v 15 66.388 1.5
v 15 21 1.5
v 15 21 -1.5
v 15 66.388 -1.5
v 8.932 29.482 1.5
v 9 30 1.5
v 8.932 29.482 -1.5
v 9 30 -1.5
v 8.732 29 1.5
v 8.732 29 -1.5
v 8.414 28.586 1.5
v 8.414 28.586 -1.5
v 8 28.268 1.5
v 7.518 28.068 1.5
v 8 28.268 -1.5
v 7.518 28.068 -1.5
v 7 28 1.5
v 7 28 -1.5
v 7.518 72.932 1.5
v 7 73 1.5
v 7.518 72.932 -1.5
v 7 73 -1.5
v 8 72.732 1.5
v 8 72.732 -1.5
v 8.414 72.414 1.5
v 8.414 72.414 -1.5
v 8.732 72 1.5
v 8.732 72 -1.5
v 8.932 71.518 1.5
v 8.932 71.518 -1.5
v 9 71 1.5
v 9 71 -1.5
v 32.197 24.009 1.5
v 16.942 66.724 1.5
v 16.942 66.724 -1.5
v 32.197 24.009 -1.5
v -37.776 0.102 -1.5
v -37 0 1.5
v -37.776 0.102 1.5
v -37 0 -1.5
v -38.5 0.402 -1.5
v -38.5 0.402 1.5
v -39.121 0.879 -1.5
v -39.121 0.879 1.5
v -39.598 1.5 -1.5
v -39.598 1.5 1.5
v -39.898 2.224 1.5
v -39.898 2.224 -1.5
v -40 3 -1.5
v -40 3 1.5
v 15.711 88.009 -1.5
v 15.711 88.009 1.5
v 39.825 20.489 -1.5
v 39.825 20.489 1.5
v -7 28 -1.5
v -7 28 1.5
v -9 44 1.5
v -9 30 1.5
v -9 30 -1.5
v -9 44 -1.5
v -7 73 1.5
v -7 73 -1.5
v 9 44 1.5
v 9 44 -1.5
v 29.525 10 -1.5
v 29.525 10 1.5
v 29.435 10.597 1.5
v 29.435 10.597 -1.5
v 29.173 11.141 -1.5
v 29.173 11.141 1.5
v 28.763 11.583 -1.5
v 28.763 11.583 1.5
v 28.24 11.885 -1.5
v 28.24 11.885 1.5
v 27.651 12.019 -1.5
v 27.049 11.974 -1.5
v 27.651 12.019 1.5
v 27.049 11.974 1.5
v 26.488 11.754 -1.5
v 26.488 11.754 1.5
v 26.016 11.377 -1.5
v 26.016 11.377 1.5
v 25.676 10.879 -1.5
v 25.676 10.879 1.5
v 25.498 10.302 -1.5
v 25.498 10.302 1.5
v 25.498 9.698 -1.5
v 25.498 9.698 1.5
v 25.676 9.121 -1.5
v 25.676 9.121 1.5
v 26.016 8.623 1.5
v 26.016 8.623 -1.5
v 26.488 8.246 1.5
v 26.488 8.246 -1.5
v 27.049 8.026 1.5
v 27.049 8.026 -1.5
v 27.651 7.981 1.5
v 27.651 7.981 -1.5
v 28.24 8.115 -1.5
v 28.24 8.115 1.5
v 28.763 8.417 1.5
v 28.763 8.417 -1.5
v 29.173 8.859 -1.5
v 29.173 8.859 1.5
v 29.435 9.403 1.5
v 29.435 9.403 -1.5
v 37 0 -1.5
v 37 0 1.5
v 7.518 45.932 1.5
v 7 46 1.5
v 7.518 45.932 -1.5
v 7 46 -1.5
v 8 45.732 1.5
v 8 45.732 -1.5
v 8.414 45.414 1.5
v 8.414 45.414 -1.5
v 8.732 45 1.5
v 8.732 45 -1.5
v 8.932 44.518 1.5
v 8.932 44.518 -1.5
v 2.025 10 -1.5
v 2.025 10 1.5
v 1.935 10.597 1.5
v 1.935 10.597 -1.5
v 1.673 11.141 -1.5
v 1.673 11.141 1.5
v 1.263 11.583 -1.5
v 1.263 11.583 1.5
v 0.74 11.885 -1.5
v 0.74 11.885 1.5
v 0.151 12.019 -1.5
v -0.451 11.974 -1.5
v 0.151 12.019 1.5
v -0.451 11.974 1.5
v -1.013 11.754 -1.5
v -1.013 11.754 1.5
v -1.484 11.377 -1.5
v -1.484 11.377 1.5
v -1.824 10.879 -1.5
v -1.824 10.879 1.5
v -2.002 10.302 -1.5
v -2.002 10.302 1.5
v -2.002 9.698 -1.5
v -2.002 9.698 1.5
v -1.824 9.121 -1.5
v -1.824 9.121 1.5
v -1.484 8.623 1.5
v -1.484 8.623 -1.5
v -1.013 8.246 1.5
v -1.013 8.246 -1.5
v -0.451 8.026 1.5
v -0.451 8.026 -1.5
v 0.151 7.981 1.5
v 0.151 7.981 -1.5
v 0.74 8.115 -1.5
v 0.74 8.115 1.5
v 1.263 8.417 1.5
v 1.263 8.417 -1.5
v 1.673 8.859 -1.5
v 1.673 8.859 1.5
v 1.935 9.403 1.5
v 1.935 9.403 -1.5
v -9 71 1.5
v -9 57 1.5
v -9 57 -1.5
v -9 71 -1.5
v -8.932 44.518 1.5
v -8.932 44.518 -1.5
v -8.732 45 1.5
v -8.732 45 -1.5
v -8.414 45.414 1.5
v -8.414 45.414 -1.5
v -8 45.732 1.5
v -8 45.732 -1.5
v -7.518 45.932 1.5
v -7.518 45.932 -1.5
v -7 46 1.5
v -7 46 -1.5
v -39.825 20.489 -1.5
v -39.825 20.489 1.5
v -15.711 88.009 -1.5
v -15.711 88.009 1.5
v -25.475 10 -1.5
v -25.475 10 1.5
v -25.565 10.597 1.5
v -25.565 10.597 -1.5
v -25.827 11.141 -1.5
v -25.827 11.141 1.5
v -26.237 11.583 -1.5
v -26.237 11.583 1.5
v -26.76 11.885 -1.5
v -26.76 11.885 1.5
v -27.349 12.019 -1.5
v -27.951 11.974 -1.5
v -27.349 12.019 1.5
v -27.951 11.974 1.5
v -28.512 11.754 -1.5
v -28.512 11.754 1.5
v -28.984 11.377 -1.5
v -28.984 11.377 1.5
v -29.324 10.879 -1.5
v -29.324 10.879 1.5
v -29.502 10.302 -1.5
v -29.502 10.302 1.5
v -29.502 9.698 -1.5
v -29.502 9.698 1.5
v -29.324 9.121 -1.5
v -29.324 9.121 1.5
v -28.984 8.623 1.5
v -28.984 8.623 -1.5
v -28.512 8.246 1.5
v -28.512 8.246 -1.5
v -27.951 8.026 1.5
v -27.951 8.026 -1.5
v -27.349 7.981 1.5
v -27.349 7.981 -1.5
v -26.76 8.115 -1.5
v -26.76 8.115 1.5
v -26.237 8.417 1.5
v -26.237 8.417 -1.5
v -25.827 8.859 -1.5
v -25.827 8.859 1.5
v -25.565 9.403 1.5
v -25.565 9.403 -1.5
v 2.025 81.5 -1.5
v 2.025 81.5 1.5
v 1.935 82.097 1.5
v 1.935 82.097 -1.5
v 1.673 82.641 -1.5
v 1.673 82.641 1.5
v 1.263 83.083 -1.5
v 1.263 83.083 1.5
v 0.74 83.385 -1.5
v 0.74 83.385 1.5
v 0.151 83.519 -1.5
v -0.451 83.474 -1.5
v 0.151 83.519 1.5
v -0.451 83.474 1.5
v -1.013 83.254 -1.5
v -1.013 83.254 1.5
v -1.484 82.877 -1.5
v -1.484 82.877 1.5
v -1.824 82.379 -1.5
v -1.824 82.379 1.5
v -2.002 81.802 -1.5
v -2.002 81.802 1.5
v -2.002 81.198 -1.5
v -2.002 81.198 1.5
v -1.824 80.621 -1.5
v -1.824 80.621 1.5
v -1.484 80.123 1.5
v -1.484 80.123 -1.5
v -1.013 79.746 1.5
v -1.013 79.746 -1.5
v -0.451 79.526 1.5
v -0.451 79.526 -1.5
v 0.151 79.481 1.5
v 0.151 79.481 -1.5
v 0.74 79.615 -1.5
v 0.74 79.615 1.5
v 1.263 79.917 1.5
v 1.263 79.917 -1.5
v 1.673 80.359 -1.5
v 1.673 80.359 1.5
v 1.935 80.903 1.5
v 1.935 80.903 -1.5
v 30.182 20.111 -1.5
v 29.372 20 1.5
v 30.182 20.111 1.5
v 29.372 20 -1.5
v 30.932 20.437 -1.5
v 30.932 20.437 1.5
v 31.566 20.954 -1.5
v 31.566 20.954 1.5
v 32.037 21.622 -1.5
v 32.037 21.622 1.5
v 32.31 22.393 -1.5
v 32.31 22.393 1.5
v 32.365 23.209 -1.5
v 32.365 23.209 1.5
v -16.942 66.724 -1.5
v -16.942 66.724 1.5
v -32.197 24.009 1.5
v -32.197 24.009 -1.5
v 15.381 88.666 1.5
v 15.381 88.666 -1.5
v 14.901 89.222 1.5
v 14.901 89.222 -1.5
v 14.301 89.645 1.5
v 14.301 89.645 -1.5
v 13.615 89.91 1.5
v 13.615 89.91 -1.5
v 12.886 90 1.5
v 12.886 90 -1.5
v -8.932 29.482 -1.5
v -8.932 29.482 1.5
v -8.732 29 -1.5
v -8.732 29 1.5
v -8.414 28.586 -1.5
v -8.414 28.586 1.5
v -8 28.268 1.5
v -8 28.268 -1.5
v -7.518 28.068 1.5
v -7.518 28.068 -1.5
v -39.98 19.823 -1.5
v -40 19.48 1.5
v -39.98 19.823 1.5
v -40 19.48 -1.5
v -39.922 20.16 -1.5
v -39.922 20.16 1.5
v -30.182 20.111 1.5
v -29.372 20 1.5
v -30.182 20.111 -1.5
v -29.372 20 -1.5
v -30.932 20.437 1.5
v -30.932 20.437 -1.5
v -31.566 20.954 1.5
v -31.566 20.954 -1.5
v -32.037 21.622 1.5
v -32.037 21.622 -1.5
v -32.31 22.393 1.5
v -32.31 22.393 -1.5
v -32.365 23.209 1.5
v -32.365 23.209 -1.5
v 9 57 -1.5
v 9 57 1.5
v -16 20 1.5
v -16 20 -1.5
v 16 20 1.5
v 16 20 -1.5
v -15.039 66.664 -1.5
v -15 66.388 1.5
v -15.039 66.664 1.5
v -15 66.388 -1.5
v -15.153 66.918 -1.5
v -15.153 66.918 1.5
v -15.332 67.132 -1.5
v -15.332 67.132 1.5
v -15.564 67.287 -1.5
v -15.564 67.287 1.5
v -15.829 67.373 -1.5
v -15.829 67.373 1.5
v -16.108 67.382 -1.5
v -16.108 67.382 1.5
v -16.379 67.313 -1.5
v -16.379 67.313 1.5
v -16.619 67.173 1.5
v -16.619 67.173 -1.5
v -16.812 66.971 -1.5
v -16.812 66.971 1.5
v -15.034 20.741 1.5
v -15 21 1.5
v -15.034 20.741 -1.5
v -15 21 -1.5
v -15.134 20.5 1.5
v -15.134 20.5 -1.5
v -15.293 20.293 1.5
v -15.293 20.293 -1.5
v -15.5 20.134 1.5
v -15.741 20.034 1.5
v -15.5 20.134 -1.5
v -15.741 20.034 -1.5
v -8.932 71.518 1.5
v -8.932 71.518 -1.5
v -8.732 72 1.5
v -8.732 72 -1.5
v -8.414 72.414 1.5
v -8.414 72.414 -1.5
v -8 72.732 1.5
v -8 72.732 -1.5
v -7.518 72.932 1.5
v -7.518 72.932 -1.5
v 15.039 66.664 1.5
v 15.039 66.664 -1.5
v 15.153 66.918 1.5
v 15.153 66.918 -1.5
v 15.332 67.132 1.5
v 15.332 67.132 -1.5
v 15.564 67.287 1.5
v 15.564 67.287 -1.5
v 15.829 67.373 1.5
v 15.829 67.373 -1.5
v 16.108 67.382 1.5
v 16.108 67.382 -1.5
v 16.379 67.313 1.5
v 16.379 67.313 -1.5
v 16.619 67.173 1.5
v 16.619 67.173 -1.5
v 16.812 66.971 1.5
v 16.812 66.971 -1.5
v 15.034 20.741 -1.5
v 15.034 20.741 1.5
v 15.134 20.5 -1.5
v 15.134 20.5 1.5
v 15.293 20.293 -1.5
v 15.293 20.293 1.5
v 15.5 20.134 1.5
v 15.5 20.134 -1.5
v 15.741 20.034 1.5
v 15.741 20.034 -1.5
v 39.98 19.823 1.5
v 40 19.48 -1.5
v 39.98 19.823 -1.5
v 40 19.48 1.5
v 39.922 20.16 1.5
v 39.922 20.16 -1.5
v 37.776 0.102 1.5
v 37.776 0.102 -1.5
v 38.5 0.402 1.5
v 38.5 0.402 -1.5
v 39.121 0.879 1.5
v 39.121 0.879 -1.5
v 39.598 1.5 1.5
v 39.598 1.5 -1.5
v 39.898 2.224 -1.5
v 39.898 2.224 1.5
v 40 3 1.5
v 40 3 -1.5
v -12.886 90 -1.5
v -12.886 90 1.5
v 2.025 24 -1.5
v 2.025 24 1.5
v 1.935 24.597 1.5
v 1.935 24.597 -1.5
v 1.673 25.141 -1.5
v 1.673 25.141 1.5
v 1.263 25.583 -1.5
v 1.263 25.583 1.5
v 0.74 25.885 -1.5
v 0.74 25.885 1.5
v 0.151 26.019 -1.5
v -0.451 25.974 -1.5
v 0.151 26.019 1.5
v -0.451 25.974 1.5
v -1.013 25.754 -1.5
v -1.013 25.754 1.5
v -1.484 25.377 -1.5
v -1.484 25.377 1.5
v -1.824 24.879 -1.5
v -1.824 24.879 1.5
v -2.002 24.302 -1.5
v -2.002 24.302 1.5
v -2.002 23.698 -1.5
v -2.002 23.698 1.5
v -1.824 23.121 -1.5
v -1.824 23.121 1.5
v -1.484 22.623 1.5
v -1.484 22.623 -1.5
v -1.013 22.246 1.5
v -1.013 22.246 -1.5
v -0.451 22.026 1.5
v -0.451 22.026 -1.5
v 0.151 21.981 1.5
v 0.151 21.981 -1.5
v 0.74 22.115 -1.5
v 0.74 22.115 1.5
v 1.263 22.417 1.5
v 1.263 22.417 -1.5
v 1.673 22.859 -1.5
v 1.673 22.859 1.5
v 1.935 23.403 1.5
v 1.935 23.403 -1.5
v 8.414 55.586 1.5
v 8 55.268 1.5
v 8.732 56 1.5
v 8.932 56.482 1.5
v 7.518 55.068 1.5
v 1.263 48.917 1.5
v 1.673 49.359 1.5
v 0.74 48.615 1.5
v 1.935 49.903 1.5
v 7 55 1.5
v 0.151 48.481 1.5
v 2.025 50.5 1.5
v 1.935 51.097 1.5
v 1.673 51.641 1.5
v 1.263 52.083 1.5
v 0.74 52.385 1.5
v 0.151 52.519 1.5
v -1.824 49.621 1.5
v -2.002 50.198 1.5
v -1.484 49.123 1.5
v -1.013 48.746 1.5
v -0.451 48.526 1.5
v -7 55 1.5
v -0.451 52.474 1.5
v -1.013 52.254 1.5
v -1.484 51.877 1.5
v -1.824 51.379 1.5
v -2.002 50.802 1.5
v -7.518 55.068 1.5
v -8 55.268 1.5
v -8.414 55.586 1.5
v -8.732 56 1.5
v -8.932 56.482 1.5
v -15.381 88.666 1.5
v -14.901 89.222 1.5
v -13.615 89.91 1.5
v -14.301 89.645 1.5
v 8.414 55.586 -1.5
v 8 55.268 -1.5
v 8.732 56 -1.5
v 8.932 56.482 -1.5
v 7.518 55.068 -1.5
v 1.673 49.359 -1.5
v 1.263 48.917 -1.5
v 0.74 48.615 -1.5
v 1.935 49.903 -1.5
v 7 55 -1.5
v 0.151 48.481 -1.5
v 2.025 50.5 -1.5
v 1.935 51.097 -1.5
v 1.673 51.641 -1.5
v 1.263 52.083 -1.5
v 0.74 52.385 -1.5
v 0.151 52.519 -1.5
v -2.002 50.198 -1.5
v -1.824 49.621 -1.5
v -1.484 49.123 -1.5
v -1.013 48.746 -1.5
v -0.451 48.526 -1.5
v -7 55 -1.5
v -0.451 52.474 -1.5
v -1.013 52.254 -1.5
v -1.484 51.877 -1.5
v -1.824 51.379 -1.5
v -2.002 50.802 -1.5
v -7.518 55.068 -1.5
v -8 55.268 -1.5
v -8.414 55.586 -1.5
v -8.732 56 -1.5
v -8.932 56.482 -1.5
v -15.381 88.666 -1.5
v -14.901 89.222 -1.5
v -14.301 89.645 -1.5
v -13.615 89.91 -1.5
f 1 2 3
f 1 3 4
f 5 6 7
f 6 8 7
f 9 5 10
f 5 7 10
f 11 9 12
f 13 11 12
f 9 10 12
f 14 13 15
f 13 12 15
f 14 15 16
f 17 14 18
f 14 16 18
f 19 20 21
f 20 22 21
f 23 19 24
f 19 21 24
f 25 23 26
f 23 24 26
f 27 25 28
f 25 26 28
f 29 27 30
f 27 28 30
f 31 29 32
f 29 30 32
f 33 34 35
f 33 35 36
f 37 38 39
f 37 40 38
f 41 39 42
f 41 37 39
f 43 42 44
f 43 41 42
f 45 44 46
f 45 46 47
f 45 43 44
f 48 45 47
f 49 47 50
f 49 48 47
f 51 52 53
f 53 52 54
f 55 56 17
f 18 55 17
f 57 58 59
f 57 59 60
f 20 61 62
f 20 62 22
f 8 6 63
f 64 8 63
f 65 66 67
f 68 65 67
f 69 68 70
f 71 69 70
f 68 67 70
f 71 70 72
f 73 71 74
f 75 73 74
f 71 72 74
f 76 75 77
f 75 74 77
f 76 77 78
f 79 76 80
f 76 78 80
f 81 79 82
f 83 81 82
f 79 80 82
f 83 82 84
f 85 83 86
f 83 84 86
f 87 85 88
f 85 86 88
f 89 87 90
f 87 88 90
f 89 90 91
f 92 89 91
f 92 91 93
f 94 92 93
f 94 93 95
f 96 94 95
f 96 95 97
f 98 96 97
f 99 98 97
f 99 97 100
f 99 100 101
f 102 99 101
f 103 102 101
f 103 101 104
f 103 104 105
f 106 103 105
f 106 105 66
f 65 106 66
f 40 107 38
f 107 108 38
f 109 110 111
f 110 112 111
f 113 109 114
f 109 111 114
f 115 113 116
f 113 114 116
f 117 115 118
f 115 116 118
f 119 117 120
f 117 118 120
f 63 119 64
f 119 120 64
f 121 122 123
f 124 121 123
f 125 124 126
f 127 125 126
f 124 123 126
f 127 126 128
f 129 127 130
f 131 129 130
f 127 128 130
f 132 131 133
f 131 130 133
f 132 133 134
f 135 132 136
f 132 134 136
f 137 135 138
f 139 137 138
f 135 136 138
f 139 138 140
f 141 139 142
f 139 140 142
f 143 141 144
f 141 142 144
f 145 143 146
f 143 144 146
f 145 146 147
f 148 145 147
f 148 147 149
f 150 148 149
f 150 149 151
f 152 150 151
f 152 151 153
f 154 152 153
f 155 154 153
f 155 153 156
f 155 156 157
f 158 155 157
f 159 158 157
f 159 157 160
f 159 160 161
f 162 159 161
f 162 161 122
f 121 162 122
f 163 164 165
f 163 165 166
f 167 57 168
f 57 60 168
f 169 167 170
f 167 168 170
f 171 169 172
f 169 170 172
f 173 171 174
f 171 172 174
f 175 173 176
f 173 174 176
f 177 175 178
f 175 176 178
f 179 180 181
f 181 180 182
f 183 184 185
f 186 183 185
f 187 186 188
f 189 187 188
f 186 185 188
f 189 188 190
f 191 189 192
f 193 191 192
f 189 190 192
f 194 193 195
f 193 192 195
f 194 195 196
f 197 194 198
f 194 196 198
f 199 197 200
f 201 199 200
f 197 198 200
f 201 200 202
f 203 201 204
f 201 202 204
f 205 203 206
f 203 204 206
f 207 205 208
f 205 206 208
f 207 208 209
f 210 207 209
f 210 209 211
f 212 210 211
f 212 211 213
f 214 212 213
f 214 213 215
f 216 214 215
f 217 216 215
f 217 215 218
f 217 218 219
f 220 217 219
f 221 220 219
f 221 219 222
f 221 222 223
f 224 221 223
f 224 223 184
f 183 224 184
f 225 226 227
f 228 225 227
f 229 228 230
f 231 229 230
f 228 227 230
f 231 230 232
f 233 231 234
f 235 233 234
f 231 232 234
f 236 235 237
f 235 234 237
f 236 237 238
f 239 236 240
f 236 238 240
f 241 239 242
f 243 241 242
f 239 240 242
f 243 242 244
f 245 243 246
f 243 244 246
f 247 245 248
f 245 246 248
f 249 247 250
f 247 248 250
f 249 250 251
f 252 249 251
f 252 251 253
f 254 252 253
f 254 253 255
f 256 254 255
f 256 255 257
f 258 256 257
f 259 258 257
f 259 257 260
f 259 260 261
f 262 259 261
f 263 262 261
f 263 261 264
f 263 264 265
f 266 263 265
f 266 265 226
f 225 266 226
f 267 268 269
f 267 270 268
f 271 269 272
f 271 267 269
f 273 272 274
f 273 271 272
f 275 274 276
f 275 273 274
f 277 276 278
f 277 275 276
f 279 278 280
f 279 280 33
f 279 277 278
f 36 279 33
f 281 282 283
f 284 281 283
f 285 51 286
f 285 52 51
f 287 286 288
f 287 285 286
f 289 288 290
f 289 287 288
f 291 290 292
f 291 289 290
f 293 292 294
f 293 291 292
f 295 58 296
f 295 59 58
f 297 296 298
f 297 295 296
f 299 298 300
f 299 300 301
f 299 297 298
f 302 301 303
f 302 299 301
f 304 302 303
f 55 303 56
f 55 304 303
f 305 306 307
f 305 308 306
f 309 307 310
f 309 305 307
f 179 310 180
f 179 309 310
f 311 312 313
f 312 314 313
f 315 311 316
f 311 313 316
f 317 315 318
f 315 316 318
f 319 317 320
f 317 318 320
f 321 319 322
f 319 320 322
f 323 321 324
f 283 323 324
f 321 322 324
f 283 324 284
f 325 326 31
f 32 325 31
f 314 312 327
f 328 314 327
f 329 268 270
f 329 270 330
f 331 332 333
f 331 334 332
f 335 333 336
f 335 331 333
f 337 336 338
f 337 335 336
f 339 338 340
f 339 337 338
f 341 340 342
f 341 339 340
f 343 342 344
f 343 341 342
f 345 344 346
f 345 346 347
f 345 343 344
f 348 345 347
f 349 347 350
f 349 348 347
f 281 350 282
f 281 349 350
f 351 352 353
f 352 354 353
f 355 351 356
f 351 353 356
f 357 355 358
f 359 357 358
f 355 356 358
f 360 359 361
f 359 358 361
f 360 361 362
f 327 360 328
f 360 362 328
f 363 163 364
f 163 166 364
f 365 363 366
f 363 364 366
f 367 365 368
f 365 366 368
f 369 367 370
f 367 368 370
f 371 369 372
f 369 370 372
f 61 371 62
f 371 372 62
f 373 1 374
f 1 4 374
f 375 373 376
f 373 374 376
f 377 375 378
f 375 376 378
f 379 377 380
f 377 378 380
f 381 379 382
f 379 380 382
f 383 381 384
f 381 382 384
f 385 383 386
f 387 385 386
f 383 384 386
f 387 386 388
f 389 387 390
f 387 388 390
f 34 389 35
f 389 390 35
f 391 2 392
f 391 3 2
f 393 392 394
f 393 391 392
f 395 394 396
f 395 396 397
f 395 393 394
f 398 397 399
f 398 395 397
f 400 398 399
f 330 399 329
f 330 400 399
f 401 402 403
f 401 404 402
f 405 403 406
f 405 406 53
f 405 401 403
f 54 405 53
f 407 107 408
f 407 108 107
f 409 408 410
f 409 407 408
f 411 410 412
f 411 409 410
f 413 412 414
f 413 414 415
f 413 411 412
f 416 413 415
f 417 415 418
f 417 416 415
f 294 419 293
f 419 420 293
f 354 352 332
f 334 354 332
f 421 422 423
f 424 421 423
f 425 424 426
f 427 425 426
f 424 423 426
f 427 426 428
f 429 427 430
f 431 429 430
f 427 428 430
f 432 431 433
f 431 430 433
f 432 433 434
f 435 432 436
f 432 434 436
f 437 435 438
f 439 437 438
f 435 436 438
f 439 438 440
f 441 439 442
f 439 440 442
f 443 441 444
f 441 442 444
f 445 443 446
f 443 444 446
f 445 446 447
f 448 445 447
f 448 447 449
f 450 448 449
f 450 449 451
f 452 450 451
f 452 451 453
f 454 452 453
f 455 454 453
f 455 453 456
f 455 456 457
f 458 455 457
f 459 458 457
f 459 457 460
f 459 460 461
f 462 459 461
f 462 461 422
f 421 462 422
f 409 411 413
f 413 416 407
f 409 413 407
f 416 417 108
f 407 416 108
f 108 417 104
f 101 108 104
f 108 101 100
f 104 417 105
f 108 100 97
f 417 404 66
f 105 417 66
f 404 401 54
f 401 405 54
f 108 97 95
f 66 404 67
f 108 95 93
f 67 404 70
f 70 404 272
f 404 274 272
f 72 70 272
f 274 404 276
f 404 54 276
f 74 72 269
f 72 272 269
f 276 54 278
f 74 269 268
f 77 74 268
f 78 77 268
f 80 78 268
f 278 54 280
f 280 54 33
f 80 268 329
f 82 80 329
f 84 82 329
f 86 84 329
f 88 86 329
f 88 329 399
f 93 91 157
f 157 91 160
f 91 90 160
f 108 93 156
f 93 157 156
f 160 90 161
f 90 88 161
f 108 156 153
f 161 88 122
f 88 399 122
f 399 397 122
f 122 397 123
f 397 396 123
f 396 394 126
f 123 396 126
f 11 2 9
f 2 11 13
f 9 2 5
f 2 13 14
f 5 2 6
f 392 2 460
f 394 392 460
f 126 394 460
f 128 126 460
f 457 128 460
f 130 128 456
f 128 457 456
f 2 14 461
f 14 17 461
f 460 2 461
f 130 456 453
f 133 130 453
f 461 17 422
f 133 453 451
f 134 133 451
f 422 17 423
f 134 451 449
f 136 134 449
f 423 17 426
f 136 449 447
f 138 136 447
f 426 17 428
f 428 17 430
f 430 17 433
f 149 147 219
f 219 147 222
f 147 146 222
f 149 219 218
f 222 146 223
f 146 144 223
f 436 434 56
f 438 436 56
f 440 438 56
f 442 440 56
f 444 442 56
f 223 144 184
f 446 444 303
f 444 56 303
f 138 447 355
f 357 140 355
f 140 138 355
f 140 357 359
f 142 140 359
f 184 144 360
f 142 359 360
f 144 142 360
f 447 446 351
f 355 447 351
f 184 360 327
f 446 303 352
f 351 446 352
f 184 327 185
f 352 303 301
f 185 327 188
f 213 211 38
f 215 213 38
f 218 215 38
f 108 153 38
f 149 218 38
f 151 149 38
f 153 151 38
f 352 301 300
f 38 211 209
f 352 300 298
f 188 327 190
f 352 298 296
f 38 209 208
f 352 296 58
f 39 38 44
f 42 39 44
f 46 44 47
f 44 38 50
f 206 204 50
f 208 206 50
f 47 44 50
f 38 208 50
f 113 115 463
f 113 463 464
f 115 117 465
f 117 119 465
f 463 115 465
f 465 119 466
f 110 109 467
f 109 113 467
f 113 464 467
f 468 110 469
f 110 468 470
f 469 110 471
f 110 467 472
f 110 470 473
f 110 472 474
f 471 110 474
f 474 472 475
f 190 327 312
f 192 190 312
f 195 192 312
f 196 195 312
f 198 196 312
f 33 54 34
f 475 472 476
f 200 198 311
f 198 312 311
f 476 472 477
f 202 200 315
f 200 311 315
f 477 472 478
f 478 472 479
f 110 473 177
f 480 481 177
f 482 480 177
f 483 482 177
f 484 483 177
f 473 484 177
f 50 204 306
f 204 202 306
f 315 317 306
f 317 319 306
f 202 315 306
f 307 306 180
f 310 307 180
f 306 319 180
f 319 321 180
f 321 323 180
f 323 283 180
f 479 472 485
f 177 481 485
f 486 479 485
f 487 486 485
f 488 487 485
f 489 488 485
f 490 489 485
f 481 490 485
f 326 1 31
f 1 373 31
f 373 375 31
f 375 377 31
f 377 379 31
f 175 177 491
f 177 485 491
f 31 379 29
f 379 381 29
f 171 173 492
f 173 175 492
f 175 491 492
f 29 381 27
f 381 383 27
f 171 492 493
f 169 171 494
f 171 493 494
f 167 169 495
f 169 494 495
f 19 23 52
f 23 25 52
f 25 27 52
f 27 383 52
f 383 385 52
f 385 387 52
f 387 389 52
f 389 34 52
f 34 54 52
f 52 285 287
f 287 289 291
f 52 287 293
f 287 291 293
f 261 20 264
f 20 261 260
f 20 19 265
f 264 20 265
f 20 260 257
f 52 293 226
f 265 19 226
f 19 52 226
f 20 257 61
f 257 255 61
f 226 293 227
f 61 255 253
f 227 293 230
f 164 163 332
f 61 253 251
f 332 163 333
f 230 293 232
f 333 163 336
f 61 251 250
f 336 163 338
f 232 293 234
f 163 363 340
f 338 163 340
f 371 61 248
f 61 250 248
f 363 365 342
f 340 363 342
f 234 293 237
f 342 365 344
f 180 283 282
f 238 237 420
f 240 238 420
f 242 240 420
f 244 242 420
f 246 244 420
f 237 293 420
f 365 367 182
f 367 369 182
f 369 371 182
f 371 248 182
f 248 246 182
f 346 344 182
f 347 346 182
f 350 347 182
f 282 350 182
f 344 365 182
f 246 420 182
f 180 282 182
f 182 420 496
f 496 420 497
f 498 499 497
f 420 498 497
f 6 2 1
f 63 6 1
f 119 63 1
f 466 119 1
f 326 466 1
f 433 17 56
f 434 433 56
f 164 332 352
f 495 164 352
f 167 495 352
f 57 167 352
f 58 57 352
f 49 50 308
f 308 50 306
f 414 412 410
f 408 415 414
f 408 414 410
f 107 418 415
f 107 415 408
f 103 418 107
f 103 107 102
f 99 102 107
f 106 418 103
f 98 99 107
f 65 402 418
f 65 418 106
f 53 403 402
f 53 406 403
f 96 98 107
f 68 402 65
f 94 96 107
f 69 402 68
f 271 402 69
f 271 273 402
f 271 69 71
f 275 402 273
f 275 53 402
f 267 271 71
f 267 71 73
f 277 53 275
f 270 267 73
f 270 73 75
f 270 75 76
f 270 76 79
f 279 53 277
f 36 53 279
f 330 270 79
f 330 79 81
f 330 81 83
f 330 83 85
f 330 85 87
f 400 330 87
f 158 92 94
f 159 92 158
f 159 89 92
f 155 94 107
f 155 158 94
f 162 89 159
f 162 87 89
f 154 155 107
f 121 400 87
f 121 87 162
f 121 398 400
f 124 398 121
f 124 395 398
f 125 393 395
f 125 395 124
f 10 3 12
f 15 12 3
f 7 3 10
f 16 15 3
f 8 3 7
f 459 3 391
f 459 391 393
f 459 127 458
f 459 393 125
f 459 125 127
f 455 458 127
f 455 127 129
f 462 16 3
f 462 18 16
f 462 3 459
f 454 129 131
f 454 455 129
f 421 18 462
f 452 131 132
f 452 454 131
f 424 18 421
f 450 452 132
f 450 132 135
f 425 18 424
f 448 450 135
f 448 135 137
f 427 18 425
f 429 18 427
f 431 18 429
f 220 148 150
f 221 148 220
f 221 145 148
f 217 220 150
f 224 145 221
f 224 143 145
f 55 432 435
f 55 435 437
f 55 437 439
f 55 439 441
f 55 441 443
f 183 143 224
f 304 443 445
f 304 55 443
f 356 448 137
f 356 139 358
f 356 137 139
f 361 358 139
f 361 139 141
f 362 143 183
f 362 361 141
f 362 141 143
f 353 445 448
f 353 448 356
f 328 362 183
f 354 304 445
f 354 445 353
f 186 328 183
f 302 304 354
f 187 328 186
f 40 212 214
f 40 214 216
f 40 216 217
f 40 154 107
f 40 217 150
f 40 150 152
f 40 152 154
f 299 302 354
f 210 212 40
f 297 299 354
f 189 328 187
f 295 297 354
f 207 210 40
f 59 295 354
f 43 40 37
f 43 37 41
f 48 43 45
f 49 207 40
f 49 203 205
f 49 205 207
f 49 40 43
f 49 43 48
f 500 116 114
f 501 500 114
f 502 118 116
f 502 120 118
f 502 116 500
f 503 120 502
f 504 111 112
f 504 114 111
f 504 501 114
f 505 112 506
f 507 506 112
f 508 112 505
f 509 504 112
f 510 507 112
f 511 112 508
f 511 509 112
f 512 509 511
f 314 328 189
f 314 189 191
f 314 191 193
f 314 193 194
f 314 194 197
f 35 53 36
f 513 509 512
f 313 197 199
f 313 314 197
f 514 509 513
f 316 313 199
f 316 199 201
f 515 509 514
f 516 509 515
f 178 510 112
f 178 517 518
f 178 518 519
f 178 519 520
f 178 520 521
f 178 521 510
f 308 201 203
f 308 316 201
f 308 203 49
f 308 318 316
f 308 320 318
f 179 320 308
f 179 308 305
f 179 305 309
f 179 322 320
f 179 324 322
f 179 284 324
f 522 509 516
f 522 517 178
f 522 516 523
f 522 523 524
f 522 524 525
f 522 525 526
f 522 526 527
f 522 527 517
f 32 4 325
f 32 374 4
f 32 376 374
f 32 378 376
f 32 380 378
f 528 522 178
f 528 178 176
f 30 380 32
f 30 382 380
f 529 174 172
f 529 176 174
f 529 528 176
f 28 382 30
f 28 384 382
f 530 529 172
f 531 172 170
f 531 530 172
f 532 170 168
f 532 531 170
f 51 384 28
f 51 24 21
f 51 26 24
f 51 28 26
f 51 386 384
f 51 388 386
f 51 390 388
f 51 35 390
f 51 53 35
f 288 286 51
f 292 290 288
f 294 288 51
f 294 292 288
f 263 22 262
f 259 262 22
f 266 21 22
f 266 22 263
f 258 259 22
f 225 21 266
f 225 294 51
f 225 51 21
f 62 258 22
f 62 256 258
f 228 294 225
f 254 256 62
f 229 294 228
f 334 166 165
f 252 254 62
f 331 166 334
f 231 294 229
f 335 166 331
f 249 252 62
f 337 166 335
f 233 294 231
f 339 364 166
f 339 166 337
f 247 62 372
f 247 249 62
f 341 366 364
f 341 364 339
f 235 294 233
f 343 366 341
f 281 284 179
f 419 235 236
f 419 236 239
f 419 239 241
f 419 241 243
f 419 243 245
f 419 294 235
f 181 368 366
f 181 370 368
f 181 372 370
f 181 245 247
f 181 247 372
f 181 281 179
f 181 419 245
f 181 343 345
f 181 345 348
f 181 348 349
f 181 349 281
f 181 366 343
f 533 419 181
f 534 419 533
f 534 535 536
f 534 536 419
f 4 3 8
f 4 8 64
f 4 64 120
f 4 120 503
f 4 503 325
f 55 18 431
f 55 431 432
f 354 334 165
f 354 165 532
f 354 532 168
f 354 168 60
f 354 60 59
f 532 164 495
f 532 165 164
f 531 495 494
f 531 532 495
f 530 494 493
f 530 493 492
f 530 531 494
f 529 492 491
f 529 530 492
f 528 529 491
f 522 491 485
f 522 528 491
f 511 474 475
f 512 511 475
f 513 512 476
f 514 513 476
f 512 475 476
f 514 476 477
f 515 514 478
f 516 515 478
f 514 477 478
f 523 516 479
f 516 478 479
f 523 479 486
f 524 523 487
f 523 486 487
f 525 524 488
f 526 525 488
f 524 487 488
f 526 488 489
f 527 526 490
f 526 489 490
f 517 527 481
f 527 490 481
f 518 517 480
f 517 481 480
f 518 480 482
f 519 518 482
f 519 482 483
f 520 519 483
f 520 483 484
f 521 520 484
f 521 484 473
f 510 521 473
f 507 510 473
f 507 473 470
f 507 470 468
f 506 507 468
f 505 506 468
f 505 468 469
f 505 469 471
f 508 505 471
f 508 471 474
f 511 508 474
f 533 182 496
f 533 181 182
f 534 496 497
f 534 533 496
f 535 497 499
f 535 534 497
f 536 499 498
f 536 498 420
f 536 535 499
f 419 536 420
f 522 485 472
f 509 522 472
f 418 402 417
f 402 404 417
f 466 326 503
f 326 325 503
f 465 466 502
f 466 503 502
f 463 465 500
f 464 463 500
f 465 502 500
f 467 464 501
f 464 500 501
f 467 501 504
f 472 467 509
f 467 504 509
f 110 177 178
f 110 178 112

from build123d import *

# Parameters (mm, degrees)
EXTRUDE_1_DEPTH          = 1.5
SKETCH_2_W               = 18
SKETCH_2_H               = 18
CUT_EXTRUDE_1_DEPTH      = 3
FILLET_1_R               = 1
FILLET_2_R               = 2
FILLET_3_R               = 3
SKETCH_3_R               = 2.025
CUT_EXTRUDE_2_DEPTH      = 1
CUT_EXTRUDE_2_DEPTH_BACK = 4
SKETCH_4_R               = 2.025
CUT_EXTRUDE_3_DEPTH      = 1
CUT_EXTRUDE_3_DEPTH_BACK = 4
SKETCH_5_R               = 2.025
CUT_EXTRUDE_4_DEPTH      = 1
CUT_EXTRUDE_4_DEPTH_BACK = 4
FILLET_4_R               = 3


with BuildPart() as part:
    # 草图1 → 凸台-拉伸1 (new body, symmetric)
    with BuildSketch(Plane.XY):
        Polygon((40, 0), (-40, 0), (-40, 20), (-15, 90), (15, 90), (40, 20), align=None)
    extrude(amount=EXTRUDE_1_DEPTH, both=True)

    # 草图2 → 切除-拉伸1 (cut)
    with BuildSketch(Plane.XY.offset(1.5)):
        Polygon((-15, 72.160717503), (-33.62882768, 20), (-15, 20), align=None)
        with Locations((0, 64)):
            Rectangle(SKETCH_2_W, SKETCH_2_H)
        with Locations((0, 37)):
            Rectangle(SKETCH_2_W, SKETCH_2_H)
        Polygon((15, 20), (15, 72.160717503), (33.62882768, 20), align=None)
    extrude(amount=-CUT_EXTRUDE_1_DEPTH, mode=Mode.SUBTRACT)

    # 圆角1
    fillet_1_edges = [part.edges().sort_by_distance(p)[0] for p in [
        (-15, 20, 0),
        (-15, 72.160717503, 0),
        (15, 72.160717503, 0),
        (15, 20, 0),
    ]]
    fillet(fillet_1_edges, radius=FILLET_1_R)

    # 圆角2
    fillet_2_edges = [part.edges().sort_by_distance(p)[0] for p in [
        (-9, 46, 0),
        (-9, 28, 0),
        (9, 28, 0),
        (9, 46, 0),
        (-9, 73, 0),
        (-9, 55, 0),
        (9, 55, 0),
        (9, 73, 0),
    ]]
    fillet(fillet_2_edges, radius=FILLET_2_R)

    # 圆角3
    fillet_3_edges = [part.edges().sort_by_distance(p)[0] for p in [
        (40, 0, 0),
        (-40, 0, 0),
        (-40, 20, 0),
        (-15, 90, 0),
        (15, 90, 0),
        (40, 20, 0),
    ]]
    fillet(fillet_3_edges, radius=FILLET_3_R)

    # 草图3 → 切除-拉伸2 (cut, two sides)
    with BuildSketch(Plane.XY.offset(1.5)) as cut_extrude_2_sk:
        with Locations((-27.5, 10)):
            Circle(SKETCH_3_R)
        with Locations((27.5, 10)):
            Circle(SKETCH_3_R)
    extrude(amount=CUT_EXTRUDE_2_DEPTH, mode=Mode.SUBTRACT)
    extrude(cut_extrude_2_sk.sketch, amount=-CUT_EXTRUDE_2_DEPTH_BACK, mode=Mode.SUBTRACT)

    # 草图4 → 切除-拉伸3 (cut, two sides)
    with BuildSketch(Plane.XY.offset(1.5)) as cut_extrude_3_sk:
        with Locations((0, 10)):
            Circle(SKETCH_4_R)
    extrude(amount=CUT_EXTRUDE_3_DEPTH, mode=Mode.SUBTRACT)
    extrude(cut_extrude_3_sk.sketch, amount=-CUT_EXTRUDE_3_DEPTH_BACK, mode=Mode.SUBTRACT)

    # 草图5 → 切除-拉伸4 (cut, two sides)
    with BuildSketch(Plane.XY.offset(1.5)) as cut_extrude_4_sk:
        with Locations((0, 24)):
            Circle(SKETCH_5_R)
        with Locations((0, 50.5)):
            Circle(SKETCH_5_R)
        with Locations((0, 81.5)):
            Circle(SKETCH_5_R)
    extrude(amount=CUT_EXTRUDE_4_DEPTH, mode=Mode.SUBTRACT)
    extrude(cut_extrude_4_sk.sketch, amount=-CUT_EXTRUDE_4_DEPTH_BACK, mode=Mode.SUBTRACT)

    # 圆角4
    fillet_4_edges = [part.edges().sort_by_distance(p)[0] for p in [
        (-33.62882768, 20, 0),
        (33.62882768, 20, 0),
    ]]
    fillet(fillet_4_edges, radius=FILLET_4_R)


solid = part.part
